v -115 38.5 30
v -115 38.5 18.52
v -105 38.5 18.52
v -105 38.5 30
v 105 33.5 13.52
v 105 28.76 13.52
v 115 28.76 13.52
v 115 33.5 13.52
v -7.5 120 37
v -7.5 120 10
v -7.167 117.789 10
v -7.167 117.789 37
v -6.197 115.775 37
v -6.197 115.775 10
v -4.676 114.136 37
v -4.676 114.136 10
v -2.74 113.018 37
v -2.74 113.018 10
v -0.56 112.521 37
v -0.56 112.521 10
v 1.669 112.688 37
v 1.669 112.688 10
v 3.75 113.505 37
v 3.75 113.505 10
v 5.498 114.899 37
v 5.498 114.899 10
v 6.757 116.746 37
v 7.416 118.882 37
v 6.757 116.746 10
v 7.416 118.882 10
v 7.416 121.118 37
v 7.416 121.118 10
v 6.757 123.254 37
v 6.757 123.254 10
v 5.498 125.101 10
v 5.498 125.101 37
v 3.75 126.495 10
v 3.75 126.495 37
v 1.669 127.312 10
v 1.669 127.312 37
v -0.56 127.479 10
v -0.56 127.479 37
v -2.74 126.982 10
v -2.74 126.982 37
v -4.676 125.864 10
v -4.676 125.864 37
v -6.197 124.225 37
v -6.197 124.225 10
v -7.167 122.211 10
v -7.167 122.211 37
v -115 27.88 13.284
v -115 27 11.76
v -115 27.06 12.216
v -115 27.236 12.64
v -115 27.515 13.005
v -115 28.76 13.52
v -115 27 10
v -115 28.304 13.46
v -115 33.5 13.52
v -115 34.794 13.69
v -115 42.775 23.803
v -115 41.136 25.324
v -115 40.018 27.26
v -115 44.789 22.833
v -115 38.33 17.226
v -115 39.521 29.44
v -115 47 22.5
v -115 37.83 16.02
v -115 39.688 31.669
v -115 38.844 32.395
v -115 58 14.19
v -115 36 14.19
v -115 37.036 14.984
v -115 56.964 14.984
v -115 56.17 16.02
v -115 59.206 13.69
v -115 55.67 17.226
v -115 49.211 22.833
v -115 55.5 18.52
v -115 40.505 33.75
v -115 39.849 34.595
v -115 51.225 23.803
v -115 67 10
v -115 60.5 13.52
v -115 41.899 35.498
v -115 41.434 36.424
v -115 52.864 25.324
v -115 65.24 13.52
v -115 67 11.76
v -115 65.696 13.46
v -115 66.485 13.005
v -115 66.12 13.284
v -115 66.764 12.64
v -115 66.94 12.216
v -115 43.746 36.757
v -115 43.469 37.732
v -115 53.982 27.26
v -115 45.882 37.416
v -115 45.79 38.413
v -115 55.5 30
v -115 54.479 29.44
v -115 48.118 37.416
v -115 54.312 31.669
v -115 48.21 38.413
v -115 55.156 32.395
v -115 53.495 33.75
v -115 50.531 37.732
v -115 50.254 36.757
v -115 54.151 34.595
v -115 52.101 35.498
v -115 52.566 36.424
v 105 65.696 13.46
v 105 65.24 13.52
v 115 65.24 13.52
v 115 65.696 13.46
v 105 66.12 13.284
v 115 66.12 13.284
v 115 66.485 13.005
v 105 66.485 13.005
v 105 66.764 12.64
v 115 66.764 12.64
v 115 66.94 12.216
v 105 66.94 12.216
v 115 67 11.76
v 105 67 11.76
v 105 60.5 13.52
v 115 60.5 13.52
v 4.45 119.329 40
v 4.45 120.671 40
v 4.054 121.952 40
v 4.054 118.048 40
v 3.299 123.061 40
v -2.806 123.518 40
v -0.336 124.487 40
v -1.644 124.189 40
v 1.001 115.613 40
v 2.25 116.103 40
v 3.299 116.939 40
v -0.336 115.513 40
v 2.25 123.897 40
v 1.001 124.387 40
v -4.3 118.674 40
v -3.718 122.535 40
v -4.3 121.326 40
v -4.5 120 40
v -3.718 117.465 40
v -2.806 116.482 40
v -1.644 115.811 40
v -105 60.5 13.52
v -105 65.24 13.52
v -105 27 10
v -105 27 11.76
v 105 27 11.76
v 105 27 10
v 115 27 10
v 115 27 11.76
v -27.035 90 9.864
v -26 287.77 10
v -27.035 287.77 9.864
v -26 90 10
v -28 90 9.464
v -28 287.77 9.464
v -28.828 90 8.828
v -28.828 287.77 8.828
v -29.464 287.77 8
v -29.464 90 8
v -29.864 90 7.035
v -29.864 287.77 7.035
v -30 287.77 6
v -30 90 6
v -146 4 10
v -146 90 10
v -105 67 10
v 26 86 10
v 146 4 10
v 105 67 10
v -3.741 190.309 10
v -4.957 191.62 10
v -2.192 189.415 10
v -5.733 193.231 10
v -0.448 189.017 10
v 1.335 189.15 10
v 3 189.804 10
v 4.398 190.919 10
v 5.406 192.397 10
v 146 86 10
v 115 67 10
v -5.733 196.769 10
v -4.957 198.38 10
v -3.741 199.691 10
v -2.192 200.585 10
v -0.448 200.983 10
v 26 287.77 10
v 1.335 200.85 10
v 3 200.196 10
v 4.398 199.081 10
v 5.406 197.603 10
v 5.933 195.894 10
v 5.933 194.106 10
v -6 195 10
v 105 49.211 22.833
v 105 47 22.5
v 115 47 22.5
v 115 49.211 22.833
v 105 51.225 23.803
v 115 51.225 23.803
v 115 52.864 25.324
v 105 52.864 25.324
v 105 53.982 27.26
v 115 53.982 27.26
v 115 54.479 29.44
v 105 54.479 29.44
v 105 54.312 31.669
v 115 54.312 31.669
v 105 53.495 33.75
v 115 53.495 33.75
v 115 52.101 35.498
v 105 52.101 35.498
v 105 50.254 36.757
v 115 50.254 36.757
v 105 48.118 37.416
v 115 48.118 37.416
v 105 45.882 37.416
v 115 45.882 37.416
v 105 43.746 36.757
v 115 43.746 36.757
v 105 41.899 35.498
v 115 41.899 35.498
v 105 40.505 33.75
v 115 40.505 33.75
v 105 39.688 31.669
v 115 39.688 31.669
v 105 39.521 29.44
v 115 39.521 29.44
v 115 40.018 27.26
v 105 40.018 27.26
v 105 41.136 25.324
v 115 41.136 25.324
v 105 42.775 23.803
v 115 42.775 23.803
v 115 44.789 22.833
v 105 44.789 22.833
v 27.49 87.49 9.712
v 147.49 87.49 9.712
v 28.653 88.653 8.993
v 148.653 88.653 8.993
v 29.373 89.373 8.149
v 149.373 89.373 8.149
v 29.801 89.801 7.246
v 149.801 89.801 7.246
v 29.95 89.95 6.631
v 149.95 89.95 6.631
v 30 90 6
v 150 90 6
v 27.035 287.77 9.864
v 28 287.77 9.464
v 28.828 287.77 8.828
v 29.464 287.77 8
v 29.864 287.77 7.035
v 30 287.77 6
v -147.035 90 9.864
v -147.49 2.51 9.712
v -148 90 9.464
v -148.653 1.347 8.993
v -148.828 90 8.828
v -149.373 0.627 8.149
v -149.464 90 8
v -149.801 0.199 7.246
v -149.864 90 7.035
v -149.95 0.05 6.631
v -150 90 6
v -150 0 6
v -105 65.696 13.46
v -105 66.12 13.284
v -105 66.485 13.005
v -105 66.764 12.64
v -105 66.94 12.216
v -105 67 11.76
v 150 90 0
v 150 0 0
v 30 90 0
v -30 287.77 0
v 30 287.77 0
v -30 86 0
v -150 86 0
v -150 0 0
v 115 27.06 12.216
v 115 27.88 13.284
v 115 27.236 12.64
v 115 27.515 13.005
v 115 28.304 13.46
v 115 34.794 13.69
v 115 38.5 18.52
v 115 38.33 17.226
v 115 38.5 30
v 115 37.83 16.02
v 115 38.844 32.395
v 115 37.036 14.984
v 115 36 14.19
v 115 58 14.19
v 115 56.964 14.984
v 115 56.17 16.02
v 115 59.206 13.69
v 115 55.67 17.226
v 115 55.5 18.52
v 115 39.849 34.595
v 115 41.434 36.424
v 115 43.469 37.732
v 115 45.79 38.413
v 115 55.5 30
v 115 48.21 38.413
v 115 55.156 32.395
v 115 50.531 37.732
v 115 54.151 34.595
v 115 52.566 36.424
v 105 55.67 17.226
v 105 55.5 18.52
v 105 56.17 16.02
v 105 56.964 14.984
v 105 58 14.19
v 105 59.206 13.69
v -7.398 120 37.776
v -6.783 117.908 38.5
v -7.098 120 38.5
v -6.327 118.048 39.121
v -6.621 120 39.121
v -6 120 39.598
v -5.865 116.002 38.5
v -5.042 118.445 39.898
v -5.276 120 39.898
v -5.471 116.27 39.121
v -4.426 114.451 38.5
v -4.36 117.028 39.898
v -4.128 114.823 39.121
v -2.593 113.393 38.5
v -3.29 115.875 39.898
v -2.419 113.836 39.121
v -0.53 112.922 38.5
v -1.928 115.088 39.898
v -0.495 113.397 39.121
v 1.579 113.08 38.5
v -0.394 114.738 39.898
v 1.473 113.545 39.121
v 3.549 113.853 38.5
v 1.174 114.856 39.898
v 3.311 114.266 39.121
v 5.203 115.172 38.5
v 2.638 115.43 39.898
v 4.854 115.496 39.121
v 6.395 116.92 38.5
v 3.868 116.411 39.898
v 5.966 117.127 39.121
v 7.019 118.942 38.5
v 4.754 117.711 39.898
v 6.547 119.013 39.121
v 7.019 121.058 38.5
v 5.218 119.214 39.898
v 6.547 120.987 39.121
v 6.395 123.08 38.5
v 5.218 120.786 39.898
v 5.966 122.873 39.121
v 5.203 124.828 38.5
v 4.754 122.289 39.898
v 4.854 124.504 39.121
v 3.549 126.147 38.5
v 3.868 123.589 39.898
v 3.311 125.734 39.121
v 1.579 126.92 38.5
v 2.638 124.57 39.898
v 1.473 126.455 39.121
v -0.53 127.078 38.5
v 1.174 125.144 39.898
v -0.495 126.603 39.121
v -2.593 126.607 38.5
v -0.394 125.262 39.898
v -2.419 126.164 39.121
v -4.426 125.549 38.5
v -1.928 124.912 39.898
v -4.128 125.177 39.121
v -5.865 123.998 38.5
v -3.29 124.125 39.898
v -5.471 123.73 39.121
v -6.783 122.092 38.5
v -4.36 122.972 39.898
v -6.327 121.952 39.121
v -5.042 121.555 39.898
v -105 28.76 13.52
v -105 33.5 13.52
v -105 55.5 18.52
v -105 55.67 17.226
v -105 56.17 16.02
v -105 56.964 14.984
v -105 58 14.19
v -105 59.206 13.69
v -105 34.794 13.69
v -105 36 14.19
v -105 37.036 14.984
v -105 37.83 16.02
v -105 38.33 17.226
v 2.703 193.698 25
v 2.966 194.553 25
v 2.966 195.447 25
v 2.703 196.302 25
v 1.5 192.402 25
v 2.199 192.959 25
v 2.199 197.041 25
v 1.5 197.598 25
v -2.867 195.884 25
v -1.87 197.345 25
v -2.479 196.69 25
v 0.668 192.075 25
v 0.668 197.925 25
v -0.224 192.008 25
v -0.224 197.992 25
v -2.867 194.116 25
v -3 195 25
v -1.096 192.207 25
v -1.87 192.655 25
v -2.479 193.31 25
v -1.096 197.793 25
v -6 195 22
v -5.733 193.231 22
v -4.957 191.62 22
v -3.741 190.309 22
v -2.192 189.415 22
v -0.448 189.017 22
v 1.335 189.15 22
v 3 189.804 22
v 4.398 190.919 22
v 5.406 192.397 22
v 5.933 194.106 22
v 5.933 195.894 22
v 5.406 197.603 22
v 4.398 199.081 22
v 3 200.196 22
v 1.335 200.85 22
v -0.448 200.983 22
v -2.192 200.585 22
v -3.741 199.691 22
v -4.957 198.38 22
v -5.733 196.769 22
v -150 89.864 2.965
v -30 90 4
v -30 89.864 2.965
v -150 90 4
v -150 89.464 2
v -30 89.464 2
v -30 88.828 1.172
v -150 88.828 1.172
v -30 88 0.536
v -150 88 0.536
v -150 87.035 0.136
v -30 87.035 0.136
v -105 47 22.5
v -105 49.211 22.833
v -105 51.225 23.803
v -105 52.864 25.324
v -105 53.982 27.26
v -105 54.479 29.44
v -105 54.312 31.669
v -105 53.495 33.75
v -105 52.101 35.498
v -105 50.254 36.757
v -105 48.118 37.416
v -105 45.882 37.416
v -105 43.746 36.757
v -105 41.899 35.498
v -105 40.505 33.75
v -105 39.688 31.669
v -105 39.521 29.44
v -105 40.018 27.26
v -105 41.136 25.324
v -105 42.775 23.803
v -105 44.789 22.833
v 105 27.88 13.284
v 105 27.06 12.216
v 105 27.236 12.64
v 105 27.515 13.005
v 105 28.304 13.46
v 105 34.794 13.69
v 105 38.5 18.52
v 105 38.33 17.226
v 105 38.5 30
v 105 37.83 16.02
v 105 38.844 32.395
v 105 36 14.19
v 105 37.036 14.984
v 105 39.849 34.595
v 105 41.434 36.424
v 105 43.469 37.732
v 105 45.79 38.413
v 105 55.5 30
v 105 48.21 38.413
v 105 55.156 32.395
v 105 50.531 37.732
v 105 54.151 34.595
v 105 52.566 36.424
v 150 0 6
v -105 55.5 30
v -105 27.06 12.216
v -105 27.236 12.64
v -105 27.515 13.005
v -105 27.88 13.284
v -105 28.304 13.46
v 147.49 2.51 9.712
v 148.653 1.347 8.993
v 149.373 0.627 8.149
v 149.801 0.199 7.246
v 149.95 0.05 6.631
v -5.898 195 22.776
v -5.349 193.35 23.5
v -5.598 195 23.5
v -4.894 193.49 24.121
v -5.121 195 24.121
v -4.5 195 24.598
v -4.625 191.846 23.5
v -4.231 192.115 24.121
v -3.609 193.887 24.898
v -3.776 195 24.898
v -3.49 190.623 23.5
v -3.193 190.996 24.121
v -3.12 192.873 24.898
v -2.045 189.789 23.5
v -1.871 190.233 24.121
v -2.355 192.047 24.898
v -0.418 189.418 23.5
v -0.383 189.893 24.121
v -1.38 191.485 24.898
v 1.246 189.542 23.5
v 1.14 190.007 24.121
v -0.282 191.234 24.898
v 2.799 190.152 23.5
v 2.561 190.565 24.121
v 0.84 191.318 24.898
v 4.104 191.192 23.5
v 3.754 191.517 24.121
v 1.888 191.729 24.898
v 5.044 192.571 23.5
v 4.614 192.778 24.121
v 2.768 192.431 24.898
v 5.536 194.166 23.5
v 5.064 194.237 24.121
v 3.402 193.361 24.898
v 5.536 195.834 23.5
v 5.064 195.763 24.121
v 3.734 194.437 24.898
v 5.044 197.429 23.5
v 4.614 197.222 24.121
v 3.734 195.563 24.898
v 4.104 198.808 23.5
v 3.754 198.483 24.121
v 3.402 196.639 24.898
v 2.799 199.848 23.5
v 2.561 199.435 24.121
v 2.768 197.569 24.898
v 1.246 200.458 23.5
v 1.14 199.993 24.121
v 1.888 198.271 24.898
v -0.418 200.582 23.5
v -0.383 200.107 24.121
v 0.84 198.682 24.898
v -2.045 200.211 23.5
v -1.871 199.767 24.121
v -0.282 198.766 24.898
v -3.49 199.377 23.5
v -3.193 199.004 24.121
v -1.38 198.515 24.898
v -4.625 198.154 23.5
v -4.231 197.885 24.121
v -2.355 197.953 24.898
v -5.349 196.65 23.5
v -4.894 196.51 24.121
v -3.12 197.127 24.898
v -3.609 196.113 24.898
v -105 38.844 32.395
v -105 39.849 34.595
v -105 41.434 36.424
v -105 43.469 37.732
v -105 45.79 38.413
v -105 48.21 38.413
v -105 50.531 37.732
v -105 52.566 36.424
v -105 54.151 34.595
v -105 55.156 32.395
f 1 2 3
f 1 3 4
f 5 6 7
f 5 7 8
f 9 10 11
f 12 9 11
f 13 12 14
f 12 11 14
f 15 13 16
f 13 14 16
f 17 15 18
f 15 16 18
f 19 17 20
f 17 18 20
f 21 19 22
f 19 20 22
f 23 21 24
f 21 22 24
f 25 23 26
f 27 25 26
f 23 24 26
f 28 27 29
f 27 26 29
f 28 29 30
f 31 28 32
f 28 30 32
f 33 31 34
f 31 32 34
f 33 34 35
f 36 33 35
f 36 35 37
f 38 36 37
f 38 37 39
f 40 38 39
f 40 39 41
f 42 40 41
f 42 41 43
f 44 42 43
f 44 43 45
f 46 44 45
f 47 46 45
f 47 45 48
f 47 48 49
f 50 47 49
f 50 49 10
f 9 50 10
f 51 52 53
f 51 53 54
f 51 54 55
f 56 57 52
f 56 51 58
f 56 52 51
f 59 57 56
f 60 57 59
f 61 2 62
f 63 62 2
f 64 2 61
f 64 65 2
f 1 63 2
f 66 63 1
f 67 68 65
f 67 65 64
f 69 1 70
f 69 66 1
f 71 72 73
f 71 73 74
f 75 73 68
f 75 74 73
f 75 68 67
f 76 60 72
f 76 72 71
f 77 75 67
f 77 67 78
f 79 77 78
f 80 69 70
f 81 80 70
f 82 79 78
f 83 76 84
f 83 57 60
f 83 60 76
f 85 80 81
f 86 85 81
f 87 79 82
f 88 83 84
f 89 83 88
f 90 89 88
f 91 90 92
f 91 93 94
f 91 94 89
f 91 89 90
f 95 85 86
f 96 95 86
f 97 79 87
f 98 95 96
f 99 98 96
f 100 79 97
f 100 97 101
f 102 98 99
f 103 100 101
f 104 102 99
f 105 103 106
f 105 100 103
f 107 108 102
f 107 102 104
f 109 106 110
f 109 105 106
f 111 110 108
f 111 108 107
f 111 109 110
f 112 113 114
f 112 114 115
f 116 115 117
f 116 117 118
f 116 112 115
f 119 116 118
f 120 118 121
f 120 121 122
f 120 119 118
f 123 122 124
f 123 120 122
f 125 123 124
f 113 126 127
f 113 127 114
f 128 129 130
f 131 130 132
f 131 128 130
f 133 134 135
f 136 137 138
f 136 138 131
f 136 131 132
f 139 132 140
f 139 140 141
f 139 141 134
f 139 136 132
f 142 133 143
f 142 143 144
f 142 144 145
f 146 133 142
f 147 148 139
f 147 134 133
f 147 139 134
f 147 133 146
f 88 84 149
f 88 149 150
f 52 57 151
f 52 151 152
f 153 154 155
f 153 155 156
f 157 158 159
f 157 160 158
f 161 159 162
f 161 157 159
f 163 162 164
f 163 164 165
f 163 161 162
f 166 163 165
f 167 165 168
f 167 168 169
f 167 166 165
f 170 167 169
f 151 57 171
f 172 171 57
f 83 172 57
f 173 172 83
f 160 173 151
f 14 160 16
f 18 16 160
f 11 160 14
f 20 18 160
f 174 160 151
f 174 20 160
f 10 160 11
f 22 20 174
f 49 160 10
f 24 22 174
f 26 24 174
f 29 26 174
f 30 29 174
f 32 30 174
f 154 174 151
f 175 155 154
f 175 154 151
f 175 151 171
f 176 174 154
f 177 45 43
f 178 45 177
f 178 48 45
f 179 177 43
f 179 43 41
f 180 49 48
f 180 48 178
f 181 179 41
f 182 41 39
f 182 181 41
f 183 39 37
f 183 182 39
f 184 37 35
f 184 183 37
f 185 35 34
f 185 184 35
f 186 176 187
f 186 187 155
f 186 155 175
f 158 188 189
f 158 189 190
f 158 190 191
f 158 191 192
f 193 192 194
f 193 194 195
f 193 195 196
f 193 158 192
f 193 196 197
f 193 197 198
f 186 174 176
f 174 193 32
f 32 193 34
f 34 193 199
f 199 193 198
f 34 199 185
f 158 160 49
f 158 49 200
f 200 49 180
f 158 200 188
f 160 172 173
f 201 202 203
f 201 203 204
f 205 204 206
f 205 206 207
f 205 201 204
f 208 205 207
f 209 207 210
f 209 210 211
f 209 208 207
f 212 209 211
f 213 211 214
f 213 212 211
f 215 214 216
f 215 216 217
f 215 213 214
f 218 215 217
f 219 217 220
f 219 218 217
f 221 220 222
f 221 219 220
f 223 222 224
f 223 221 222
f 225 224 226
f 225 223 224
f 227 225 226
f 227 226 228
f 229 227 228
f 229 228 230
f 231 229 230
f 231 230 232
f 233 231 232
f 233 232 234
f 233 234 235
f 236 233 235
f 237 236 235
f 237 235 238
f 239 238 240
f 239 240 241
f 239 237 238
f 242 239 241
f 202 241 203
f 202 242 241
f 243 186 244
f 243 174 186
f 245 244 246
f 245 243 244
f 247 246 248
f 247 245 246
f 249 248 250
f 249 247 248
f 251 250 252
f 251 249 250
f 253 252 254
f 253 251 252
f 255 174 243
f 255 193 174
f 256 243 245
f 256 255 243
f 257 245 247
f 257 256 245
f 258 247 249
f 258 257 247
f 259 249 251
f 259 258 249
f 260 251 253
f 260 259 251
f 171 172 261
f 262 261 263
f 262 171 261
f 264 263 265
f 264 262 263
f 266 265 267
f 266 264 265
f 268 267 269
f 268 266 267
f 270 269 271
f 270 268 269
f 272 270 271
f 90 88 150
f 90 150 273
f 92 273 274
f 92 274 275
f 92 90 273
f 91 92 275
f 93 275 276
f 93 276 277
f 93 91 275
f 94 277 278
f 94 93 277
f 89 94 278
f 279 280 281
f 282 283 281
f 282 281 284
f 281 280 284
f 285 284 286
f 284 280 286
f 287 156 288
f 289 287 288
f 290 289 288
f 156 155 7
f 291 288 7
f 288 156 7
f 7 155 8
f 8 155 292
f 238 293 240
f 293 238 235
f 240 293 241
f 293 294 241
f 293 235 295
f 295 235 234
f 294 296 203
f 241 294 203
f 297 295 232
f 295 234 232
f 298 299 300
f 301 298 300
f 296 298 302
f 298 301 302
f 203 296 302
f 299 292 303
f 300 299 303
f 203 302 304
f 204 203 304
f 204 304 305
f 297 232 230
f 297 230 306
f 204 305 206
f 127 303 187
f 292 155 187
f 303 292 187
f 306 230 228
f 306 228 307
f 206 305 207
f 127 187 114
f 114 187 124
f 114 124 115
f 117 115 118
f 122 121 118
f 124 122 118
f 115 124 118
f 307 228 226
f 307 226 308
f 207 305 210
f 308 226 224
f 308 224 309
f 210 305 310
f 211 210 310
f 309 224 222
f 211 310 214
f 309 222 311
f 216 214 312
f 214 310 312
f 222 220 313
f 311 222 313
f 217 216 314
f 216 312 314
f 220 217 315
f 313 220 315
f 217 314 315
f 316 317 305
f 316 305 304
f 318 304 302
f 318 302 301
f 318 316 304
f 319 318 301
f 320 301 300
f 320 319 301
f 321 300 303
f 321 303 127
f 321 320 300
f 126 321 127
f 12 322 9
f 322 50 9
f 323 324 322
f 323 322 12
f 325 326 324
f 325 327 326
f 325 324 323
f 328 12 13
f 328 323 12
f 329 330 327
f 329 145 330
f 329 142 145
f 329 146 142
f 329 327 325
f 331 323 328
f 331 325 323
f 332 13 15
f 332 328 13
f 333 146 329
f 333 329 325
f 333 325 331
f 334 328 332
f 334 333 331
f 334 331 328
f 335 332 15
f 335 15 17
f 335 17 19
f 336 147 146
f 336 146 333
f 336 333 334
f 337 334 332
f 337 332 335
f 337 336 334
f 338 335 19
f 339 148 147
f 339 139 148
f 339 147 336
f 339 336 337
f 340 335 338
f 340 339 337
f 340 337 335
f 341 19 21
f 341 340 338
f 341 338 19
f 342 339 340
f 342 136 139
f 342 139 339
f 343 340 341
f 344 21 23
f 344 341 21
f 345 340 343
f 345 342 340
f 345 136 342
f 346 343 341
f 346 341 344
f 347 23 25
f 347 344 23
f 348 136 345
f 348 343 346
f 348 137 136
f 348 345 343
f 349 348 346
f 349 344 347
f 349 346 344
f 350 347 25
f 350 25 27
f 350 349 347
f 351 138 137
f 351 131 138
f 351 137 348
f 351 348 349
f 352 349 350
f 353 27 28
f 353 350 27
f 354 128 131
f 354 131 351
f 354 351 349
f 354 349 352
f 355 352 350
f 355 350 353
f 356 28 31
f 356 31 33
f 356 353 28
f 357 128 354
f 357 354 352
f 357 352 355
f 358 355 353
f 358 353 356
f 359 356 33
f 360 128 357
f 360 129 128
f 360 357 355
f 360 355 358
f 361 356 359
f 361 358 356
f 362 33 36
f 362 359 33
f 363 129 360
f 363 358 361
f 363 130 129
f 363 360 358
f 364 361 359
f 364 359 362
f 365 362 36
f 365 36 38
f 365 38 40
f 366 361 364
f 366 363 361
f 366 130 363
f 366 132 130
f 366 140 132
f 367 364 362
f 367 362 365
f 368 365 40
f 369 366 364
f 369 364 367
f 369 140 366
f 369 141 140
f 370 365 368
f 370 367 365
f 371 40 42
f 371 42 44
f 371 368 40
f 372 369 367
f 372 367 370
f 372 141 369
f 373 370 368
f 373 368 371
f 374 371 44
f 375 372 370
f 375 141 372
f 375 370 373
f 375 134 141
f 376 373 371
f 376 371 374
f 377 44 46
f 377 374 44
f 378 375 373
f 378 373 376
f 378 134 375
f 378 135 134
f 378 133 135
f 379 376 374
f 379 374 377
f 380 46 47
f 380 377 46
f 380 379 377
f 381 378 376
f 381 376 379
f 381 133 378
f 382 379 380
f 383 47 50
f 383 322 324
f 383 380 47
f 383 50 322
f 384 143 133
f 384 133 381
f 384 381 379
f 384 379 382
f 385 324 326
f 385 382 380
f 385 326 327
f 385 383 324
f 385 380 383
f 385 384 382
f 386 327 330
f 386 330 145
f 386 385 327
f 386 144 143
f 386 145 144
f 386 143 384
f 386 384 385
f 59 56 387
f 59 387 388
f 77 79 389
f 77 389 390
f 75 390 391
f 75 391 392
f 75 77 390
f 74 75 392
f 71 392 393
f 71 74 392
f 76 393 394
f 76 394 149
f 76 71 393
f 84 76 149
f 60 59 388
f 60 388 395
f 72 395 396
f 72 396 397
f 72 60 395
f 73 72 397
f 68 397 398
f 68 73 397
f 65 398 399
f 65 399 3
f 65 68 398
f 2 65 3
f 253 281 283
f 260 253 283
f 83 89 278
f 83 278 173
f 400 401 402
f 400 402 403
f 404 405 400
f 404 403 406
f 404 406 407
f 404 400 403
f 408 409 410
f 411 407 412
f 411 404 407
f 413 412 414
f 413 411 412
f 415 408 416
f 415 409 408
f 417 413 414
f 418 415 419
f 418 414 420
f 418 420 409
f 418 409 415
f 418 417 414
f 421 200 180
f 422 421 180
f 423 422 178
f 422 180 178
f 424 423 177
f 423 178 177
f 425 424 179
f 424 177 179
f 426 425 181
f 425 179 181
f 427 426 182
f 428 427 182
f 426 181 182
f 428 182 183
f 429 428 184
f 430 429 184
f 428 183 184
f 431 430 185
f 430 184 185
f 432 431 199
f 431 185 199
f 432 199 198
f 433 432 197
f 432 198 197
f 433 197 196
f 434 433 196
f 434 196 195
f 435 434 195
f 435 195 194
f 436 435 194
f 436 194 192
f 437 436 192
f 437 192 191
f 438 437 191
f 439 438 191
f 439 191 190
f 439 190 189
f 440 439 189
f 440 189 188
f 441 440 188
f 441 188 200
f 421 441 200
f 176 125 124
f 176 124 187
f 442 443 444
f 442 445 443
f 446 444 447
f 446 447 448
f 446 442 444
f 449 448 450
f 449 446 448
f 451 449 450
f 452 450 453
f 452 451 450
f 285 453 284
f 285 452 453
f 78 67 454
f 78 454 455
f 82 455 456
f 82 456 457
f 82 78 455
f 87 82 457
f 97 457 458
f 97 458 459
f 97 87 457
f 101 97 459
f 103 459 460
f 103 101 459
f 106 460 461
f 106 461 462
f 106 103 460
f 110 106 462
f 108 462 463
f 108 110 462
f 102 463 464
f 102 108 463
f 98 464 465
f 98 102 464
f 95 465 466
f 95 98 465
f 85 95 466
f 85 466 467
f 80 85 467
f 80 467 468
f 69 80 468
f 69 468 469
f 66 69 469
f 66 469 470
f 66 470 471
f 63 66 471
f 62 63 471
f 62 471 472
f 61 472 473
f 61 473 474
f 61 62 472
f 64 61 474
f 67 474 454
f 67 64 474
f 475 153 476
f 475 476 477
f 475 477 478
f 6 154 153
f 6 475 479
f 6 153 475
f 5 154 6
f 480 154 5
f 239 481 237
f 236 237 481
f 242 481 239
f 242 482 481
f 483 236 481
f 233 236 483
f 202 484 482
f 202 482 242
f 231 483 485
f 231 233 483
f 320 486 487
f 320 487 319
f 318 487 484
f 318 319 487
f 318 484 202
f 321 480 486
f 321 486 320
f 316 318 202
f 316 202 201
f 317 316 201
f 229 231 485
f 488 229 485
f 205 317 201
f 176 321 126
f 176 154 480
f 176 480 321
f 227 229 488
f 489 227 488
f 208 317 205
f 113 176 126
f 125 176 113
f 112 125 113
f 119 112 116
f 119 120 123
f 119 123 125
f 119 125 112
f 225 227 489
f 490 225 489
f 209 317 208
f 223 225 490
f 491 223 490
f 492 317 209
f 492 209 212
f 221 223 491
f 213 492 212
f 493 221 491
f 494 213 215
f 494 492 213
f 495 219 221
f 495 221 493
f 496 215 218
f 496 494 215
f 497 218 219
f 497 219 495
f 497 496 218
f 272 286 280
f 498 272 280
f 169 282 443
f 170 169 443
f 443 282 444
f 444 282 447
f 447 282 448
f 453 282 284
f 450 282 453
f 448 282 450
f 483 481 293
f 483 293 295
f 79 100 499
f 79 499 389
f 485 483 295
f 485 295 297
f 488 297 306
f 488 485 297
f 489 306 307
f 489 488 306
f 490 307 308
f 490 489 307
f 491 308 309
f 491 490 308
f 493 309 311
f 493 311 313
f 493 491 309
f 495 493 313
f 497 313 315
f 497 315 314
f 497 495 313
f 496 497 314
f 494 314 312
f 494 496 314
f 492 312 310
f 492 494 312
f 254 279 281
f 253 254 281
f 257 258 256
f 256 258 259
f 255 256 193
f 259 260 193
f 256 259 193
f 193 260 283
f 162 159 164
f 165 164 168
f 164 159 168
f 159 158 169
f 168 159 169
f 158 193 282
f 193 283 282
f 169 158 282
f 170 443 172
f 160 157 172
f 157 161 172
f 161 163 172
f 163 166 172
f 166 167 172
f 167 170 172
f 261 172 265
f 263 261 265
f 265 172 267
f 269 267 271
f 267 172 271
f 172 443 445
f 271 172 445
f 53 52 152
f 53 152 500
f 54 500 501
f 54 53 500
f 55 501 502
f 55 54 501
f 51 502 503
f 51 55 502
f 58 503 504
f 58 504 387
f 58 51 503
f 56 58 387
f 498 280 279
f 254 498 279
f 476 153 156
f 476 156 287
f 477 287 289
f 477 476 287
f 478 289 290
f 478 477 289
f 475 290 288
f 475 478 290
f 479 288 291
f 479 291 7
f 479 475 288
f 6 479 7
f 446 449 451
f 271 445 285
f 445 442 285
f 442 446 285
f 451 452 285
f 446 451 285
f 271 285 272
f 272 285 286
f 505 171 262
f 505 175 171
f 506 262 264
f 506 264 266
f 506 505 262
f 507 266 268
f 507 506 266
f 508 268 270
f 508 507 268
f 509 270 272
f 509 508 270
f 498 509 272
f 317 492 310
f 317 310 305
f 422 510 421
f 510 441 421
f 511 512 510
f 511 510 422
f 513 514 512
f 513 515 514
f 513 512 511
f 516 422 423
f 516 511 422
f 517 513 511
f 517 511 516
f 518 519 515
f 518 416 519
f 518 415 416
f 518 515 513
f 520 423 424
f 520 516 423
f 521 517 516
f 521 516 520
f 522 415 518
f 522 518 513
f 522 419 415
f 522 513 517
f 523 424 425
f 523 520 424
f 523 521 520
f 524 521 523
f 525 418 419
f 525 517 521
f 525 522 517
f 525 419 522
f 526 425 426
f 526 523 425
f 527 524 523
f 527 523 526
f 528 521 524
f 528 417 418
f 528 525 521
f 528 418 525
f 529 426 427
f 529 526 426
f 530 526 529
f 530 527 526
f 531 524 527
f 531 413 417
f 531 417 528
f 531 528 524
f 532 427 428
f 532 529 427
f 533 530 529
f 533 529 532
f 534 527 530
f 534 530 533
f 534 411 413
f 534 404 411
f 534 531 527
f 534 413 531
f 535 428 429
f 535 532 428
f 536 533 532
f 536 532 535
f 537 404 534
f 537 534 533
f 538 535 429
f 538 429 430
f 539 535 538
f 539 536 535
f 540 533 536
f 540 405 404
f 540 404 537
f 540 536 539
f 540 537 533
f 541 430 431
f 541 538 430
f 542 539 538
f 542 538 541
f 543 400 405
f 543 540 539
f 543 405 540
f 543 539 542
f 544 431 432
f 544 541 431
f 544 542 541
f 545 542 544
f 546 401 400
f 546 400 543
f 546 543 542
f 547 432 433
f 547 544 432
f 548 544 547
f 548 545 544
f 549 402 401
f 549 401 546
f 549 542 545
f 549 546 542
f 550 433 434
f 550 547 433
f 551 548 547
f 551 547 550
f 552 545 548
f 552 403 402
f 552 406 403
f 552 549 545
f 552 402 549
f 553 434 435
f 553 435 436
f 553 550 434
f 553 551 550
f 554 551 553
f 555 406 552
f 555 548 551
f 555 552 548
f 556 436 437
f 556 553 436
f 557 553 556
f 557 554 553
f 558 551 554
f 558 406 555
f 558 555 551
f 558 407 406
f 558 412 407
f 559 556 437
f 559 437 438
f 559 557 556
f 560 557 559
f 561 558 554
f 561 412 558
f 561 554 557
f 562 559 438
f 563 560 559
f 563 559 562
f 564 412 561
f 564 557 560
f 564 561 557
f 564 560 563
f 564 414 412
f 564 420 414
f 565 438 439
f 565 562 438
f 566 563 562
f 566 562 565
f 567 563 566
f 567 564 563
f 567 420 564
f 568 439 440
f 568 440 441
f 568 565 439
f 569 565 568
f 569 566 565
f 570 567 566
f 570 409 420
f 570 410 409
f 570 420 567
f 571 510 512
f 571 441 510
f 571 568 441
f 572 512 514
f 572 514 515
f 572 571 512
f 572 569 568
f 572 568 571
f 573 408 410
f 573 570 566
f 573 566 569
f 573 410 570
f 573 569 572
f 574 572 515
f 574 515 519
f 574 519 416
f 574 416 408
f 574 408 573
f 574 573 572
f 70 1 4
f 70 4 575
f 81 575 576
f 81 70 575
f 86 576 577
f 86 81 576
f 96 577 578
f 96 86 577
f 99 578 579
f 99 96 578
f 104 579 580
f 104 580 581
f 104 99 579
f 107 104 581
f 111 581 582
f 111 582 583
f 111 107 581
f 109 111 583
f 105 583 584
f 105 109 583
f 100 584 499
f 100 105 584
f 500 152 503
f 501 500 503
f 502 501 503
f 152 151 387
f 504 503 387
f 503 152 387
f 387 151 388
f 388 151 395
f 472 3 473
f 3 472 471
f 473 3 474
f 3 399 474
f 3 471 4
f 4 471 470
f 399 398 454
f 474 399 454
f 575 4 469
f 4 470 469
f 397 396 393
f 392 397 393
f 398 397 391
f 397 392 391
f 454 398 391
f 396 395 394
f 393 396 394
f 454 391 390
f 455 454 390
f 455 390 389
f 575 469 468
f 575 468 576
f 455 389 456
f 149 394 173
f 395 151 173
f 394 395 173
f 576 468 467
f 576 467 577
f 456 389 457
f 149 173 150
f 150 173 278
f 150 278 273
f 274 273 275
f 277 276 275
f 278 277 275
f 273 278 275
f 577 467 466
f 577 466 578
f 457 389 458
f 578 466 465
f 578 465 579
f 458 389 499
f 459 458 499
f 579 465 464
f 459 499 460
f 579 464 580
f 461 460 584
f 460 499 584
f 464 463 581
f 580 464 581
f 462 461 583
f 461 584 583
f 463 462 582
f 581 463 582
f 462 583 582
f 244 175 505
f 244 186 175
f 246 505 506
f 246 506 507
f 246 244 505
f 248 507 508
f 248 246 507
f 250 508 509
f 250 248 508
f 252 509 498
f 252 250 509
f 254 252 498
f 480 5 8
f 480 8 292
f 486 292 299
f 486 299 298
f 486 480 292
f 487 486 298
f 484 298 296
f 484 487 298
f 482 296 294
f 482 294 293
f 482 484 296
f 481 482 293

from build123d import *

# Parameters (mm, degrees)
BOSS_EXTRUDE1_DEPTH = 10
SKETCH1_3_R         = 6
BOSS_EXTRUDE2_DEPTH = 25
SKETCH1_4_R         = 7.5
BOSS_EXTRUDE3_DEPTH = 40
FILLET1_R           = 3
FILLET3_R           = 4
BOSS_EXTRUDE4_START = 105
SKETCH2_R           = 7.5
BOSS_EXTRUDE4_DEPTH = 10
BOSS_EXTRUDE5_START = -115
SKETCH2_2_R         = 7.5
BOSS_EXTRUDE5_DEPTH = 10


with BuildPart() as part:
    # Sketch1 → Boss-Extrude1 (new body)
    with BuildSketch(Plane.XY):
        Polygon((-150, 0), (150, 0), (150, 90), (30, 90), (30, 287.77), (-30, 287.77), (-30, 90), (-150, 90), align=None)
    extrude(amount=BOSS_EXTRUDE1_DEPTH)

    # Sketch1<3> → Boss-Extrude2 (add)
    with BuildSketch(Plane.XY):
        with Locations((0, 195)):
            Circle(SKETCH1_3_R)
    extrude(amount=BOSS_EXTRUDE2_DEPTH)

    # Sketch1<4> → Boss-Extrude3 (add)
    with BuildSketch(Plane.XY):
        with Locations((0, 120)):
            Circle(SKETCH1_4_R)
    extrude(amount=BOSS_EXTRUDE3_DEPTH)

    # Fillet1
    fillet1_edges = [part.edges().sort_by_distance(p)[0] for p in [
        (-7.5, 120, 40),
        (-6, 195, 25),
    ]]
    fillet(fillet1_edges, radius=FILLET1_R)

    # Fillet3
    fillet3_edges = [part.edges().sort_by_distance(p)[0] for p in [
        (-150, 45, 10),
        (0, 0, 10),
        (150, 45, 10),
        (90, 90, 10),
        (30, 188.885, 10),
        (-30, 188.885, 10),
        (-90, 90, 0),
    ]]
    fillet(fillet3_edges, radius=FILLET3_R)

    # Sketch2 → Boss-Extrude4 (add)
    with BuildSketch(Plane(origin=(0, 0, 0), x_dir=(0, 0, -1), z_dir=(1, 0, 0)).offset(BOSS_EXTRUDE4_START)):
        with BuildLine():
            Line((-10, 67), (-10, 27))
            Line((-10, 27), (-11.76, 27))
            ThreePointArc((-11.76, 27), (-13.004507935, 27.515492065), (-13.52, 28.76))
            Line((-13.52, 28.76), (-13.52, 33.5))
            ThreePointArc((-13.52, 33.5), (-14.984466094, 37.035533906), (-18.52, 38.5))
            Line((-18.52, 38.5), (-30, 38.5))
            ThreePointArc((-30, 38.5), (-38.5, 47), (-30, 55.5))
            Line((-30, 55.5), (-18.52, 55.5))
            ThreePointArc((-18.52, 55.5), (-14.984466094, 56.964466094), (-13.52, 60.5))
            Line((-13.52, 60.5), (-13.52, 65.24))
            ThreePointArc((-13.52, 65.24), (-13.004507935, 66.484507935), (-11.76, 67))
            Line((-11.76, 67), (-10, 67))
        make_face()
        with Locations((-30, 47)):
            Circle(SKETCH2_R, mode=Mode.SUBTRACT)
    extrude(amount=BOSS_EXTRUDE4_DEPTH)

    # Sketch2<2> → Boss-Extrude5 (add)
    with BuildSketch(Plane(origin=(0, 0, 0), x_dir=(0, 0, -1), z_dir=(1, 0, 0)).offset(BOSS_EXTRUDE5_START)):
        with BuildLine():
            Line((-10, 67), (-10, 27))
            Line((-10, 27), (-11.76, 27))
            ThreePointArc((-11.76, 27), (-13.004507935, 27.515492065), (-13.52, 28.76))
            Line((-13.52, 28.76), (-13.52, 33.5))
            ThreePointArc((-13.52, 33.5), (-14.984466094, 37.035533906), (-18.52, 38.5))
            Line((-18.52, 38.5), (-30, 38.5))
            ThreePointArc((-30, 38.5), (-38.5, 47), (-30, 55.5))
            Line((-30, 55.5), (-18.52, 55.5))
            ThreePointArc((-18.52, 55.5), (-14.984466094, 56.964466094), (-13.52, 60.5))
            Line((-13.52, 60.5), (-13.52, 65.24))
            ThreePointArc((-13.52, 65.24), (-13.004507935, 66.484507935), (-11.76, 67))
            Line((-11.76, 67), (-10, 67))
        make_face()
        with Locations((-30, 47)):
            Circle(SKETCH2_2_R, mode=Mode.SUBTRACT)
    extrude(amount=BOSS_EXTRUDE5_DEPTH)


solid = part.part
